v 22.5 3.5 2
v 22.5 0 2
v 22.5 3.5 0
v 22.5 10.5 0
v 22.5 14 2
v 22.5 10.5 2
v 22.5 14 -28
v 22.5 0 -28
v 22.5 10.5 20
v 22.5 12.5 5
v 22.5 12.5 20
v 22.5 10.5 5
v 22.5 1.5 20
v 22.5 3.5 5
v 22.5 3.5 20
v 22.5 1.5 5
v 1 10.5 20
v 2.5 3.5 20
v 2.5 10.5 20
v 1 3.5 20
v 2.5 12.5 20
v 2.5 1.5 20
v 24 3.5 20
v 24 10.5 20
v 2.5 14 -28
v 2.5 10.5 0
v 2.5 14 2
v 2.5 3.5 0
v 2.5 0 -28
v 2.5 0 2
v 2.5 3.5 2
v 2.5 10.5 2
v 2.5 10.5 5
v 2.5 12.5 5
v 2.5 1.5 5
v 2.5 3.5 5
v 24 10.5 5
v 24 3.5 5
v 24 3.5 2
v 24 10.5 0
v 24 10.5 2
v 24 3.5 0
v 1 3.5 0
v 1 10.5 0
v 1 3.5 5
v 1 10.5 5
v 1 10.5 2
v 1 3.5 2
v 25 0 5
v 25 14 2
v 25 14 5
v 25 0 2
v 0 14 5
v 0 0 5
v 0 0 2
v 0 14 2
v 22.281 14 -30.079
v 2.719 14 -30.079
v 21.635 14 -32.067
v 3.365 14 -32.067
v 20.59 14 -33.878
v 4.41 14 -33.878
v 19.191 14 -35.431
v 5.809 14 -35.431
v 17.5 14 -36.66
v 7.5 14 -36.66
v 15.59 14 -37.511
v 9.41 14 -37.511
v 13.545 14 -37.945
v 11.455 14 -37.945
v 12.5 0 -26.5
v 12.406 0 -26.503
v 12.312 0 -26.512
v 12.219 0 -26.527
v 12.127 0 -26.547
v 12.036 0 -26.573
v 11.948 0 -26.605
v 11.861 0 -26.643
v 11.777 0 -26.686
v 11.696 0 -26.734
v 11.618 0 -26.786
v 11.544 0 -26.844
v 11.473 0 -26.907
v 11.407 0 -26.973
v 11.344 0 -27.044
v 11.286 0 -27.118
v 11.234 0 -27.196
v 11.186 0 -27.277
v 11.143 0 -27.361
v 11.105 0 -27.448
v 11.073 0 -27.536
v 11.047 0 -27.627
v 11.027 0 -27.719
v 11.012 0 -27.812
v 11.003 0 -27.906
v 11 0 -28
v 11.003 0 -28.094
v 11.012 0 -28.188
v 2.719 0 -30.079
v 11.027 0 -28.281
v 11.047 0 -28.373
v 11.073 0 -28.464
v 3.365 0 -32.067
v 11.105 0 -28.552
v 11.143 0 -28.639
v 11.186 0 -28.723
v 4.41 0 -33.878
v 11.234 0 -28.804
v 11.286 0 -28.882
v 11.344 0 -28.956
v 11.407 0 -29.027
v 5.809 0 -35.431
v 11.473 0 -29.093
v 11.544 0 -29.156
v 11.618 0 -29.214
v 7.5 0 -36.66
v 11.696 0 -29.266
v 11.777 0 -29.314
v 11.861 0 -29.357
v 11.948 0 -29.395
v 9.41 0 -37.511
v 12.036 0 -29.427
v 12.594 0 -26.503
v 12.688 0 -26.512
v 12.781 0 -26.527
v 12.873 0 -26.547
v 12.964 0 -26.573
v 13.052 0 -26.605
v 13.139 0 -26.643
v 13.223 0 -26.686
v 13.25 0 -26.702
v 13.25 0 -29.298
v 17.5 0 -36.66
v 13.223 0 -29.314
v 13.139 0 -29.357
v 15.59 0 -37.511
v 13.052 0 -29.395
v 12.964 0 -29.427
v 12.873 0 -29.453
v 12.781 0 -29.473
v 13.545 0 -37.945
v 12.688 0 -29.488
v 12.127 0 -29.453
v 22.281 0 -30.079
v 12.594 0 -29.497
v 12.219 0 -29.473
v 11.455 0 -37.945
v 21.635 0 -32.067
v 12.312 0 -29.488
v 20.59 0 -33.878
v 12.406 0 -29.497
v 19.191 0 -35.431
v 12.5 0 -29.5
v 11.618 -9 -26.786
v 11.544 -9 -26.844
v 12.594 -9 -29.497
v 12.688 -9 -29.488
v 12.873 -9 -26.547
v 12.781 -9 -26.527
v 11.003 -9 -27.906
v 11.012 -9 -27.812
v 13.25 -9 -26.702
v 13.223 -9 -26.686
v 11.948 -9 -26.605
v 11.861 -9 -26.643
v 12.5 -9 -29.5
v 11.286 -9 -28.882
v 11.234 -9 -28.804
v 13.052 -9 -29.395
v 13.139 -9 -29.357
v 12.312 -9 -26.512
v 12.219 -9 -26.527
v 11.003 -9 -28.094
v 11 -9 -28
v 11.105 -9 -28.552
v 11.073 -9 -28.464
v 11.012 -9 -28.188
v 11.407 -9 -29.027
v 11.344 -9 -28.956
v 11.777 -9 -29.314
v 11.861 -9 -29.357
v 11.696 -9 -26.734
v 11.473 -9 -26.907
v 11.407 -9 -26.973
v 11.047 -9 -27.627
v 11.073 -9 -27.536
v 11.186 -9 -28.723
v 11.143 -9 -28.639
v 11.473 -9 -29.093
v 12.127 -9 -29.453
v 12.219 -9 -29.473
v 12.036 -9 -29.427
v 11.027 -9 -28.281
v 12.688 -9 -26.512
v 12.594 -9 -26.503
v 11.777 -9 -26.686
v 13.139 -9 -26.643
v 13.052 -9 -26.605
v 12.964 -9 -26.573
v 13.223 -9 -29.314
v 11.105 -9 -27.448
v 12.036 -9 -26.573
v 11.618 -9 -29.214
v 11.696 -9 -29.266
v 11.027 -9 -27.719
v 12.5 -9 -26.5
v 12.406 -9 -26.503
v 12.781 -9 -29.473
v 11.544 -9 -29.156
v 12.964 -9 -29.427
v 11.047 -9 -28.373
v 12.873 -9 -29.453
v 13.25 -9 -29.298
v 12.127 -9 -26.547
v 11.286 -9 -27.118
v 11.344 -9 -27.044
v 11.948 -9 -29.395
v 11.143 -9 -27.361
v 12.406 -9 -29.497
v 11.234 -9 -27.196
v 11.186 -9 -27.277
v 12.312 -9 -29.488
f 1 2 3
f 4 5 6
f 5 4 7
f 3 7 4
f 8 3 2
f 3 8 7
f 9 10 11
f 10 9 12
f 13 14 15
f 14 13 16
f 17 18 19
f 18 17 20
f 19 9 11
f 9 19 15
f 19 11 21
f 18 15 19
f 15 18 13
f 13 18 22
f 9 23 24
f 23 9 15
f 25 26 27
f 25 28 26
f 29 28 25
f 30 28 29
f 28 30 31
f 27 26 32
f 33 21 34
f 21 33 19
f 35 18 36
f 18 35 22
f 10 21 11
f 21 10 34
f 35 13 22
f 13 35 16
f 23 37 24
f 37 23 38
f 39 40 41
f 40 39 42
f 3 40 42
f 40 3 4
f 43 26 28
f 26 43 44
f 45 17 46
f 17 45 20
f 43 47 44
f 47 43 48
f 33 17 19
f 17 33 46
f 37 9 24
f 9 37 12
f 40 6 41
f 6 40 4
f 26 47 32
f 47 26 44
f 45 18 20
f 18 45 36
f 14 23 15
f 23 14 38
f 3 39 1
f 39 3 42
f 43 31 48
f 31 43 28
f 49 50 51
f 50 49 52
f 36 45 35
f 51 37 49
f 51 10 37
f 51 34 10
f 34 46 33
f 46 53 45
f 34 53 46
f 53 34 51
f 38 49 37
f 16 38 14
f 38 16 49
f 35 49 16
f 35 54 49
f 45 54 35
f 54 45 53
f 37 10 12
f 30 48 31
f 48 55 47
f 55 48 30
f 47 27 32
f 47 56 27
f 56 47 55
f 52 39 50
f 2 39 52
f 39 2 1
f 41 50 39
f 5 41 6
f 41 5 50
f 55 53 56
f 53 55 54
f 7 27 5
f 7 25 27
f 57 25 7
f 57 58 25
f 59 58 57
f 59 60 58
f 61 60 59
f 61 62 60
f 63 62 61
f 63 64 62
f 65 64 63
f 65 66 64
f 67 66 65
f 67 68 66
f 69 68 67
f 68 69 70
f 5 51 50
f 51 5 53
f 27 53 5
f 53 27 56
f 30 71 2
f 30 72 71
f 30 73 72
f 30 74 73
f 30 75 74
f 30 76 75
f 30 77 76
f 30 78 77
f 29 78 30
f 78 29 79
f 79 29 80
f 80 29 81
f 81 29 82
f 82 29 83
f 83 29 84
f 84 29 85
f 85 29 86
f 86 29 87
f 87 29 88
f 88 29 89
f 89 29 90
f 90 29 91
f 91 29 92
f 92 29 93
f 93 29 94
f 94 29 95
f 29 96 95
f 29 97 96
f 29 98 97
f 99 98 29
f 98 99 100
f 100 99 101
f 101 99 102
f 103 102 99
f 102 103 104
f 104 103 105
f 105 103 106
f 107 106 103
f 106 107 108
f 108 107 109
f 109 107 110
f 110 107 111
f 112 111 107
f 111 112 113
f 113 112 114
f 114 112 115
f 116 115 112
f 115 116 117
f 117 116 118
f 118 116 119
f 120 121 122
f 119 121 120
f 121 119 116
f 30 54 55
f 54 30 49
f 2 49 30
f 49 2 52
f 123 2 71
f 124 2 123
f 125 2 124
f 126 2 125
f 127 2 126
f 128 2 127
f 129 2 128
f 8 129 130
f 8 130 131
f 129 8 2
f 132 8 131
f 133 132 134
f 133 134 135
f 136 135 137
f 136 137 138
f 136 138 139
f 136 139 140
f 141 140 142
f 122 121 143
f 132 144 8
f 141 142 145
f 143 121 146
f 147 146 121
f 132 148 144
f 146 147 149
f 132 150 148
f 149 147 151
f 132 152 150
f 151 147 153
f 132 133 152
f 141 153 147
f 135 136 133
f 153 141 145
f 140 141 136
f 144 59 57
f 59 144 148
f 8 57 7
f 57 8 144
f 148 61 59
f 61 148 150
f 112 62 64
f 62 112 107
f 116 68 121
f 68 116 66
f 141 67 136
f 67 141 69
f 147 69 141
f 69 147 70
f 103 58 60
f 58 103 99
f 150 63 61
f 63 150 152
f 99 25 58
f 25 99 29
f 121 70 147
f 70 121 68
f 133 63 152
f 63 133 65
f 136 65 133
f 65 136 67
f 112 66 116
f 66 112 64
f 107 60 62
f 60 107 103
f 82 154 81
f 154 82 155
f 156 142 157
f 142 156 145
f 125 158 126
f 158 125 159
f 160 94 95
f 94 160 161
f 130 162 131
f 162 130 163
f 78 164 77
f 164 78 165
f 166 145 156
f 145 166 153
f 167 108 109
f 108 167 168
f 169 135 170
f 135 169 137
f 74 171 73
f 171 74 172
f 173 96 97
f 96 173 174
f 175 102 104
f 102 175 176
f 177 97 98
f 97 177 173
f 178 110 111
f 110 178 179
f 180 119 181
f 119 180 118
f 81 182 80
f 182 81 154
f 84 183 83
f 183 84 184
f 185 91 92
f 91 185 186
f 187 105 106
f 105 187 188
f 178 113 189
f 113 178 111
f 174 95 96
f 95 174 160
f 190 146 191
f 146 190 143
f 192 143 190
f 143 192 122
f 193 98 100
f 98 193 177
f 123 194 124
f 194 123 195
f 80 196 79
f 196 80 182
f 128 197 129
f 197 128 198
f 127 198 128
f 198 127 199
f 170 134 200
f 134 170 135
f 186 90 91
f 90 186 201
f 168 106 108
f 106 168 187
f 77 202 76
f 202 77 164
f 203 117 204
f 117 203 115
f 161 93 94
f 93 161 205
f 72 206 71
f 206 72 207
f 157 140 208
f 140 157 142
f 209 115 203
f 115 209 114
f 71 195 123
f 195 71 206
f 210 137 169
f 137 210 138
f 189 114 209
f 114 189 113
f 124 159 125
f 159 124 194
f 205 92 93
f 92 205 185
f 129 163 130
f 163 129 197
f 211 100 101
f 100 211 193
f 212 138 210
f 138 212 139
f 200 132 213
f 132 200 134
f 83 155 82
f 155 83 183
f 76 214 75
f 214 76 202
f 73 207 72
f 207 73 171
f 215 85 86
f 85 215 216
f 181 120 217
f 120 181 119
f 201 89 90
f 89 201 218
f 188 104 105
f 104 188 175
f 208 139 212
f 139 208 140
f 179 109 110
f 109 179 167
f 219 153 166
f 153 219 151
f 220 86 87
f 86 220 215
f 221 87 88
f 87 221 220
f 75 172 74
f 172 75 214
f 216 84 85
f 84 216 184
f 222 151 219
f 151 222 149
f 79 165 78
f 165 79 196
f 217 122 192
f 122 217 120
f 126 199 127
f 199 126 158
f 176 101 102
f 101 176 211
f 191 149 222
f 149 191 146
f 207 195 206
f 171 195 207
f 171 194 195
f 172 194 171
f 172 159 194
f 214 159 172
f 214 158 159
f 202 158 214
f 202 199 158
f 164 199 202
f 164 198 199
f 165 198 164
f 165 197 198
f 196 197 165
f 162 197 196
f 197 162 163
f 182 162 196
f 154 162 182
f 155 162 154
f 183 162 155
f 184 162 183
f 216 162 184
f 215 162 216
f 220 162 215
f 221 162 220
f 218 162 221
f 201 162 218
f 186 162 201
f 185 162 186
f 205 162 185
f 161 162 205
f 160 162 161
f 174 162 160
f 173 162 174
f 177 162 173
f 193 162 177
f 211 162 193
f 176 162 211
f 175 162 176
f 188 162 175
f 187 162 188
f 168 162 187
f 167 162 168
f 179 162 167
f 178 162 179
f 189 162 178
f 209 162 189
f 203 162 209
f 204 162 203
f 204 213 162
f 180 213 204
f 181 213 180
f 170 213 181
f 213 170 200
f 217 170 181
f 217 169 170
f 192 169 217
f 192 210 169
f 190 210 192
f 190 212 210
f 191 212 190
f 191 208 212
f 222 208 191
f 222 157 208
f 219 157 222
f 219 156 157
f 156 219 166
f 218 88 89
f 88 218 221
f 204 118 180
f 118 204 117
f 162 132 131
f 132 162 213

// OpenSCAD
// мотор Pololu с лыской 
pololu_dshaft();

// ось 2мм 15см в длину
//generic_axis(r=1, length=150);

/** 
 * Просто круглая ось
 * @param length длина оси
 * @param radius радиус, по умолчанию 1мм 
 */
module generic_axis(length=22, radius=1) {
  translate([0,0,-1])
    cylinder(h=length, r=radius, $fn=100);
}


/** 
 * Ось с лыской.
 * Диаметр оси 3мм, срез с одного бока 1мм.
 * @param length длина оси
 */
module dshaft_axis(length=22) {
  // диаметр 3мм, срез с одного бока 1мм
  translate([0,0,-1])
  difference() {
    cylinder(h=length, r=1.5, $fn=100);
    translate([0.75, -1.5, 0]) 
      cube([2, 3, length]);
  }
}

/**
 * Мотор с редуктором Pololu (без вала)
 */
module pololu() {
  // бокс с мотором
  translate([2.5, 1.5, 0]) cube([20, 11, 20]);
  translate([1, 3.5, 0]) cube([23, 7, 20]);

  // "юбочка"
  translate([0, 0, 2]) cube([25, 14, 3]);
  
  // редуктор
  translate([2.5, 0, -28]) cube([20, 14, 30]);
  
  // вал
  translate([12.5, 0, -28]) rotate([270, 0, 0]) 
    cylinder(r=10, h=14);
}

/**
 * Мотор с редуктором Pololu, вал с лыской
 */
module pololu_dshaft() {
  pololu();

  // ось
  translate([12.5, 12, -28]) rotate([90, 0, 0]) 
    dshaft_axis();
}
